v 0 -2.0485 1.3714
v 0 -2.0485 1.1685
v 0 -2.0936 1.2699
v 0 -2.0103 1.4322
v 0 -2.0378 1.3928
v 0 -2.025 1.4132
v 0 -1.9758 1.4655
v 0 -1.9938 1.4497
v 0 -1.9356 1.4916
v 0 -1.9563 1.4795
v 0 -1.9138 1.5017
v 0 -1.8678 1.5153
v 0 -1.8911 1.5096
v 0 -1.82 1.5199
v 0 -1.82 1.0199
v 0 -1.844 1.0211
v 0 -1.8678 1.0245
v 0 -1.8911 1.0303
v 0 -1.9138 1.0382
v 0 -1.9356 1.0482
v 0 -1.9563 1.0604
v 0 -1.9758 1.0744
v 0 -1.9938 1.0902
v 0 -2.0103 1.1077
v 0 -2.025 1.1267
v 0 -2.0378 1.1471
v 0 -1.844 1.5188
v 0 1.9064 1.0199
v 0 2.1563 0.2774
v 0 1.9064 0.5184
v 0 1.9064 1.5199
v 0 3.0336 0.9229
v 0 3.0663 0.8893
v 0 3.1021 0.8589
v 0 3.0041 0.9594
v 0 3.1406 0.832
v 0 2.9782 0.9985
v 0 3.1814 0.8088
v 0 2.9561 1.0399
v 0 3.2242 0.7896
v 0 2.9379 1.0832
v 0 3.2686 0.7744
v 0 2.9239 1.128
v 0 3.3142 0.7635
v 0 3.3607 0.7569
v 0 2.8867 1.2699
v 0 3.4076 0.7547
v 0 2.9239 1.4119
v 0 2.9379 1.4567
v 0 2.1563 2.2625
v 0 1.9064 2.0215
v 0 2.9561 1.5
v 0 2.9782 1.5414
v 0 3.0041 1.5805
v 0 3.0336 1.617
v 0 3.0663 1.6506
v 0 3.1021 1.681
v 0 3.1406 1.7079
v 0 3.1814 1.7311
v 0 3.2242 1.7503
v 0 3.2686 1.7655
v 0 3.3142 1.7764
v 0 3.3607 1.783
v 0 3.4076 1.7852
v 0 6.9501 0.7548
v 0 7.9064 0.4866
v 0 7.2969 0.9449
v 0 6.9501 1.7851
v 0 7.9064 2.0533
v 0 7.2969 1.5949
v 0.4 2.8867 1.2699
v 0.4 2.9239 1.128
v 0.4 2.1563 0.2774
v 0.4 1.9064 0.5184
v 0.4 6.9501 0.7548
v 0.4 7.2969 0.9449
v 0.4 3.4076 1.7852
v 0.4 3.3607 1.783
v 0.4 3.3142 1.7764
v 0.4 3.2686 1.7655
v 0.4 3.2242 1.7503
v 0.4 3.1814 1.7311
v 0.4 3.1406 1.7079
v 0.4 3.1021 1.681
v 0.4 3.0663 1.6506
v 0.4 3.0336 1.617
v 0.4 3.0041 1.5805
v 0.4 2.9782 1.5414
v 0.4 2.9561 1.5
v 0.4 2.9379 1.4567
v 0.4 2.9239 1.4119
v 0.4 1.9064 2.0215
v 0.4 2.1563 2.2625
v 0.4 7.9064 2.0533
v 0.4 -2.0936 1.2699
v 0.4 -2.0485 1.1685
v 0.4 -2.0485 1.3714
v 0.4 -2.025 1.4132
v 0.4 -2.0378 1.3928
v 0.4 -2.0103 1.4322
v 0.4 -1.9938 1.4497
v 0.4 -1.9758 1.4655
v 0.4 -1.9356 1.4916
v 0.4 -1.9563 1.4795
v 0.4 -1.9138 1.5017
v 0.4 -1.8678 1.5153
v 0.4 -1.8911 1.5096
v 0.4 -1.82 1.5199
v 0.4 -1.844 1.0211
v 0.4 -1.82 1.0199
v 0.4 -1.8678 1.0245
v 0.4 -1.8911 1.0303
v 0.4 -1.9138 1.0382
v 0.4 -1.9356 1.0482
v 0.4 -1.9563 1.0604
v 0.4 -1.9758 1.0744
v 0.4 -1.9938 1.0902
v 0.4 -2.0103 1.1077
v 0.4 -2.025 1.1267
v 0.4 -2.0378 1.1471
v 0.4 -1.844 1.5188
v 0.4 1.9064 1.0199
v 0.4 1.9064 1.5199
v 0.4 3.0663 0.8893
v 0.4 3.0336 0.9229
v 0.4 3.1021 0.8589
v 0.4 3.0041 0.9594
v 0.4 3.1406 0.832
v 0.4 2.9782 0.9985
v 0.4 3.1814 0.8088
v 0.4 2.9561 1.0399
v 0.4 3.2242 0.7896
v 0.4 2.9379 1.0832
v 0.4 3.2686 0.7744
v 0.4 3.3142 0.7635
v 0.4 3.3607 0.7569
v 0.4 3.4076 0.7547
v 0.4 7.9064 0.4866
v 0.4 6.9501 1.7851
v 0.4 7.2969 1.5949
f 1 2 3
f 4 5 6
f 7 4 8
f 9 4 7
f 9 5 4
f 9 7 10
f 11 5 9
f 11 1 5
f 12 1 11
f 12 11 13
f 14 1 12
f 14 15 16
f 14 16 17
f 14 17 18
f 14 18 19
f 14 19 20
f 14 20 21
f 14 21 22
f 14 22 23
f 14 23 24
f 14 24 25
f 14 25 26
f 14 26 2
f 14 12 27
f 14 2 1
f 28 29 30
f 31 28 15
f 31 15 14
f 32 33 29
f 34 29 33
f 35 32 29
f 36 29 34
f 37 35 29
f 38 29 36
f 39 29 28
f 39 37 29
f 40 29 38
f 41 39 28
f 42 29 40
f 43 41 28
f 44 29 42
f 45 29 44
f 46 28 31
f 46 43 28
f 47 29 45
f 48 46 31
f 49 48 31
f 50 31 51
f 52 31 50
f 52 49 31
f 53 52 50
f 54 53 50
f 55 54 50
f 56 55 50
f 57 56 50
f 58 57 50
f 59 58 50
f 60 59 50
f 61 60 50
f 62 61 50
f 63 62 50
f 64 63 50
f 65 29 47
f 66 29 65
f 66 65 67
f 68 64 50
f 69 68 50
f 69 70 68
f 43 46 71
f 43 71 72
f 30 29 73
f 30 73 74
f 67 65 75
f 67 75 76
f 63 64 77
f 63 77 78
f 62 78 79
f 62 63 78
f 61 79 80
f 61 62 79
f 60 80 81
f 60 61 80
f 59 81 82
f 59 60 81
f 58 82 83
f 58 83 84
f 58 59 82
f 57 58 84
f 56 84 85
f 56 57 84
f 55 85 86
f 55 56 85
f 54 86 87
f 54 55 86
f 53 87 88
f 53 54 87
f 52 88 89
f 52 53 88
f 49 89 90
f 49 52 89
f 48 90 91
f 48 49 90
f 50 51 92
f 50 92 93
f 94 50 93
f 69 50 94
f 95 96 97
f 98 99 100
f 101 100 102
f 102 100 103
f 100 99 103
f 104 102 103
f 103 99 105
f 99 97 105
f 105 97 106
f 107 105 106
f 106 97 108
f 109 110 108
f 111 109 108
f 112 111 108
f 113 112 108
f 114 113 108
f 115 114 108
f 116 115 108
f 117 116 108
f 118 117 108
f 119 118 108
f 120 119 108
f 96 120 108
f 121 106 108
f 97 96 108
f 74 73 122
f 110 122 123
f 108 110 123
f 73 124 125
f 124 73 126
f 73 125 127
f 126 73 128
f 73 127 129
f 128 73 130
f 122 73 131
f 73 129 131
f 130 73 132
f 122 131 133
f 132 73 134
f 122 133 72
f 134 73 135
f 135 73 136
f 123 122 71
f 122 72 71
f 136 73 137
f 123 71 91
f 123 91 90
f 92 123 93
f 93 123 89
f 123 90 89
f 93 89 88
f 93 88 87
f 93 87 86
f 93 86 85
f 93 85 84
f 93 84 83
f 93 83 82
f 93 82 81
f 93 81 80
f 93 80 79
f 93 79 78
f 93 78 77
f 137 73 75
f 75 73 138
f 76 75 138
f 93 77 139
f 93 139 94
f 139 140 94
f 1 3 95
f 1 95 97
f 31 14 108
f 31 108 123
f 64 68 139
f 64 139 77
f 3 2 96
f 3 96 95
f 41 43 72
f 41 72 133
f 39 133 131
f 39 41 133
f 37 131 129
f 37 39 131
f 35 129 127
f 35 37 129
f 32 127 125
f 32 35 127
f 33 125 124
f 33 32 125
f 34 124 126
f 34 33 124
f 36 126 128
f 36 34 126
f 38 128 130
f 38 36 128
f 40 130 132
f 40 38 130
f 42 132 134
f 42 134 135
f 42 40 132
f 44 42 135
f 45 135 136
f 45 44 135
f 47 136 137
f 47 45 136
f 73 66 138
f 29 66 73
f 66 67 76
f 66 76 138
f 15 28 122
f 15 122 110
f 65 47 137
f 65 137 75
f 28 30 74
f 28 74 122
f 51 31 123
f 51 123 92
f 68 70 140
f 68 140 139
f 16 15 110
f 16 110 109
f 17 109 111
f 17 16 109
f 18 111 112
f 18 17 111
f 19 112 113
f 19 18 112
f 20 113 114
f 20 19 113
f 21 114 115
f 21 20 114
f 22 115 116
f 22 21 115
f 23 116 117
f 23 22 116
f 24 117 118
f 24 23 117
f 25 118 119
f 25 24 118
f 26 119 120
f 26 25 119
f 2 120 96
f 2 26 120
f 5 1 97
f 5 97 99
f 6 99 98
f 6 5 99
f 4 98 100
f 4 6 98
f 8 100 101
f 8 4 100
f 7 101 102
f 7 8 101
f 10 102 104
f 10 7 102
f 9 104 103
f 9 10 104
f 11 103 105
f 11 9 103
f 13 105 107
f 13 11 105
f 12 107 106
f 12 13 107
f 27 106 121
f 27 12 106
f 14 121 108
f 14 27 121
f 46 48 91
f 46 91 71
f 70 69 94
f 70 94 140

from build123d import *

# Parameters (mm, degrees)
BOSS_EXTRUDE1_DEPTH = 0.4


with BuildPart() as part:
    # Sketch1 → Boss-Extrude1 (new body)
    with BuildSketch(Plane(origin=(0, 0, 0), x_dir=(0, 0, -1), z_dir=(1, 0, 0))):
        with BuildLine():
            Line((-0.486576567, 7.906439428), (-0.277438328, 2.156274237))
            Line((-0.277438328, 2.156274237), (-0.518351631, 1.906439428))
            Line((-0.518351631, 1.906439428), (-1.019947879, 1.906439428))
            Line((-1.019947879, 1.906439428), (-1.019947879, -1.820037787))
            ThreePointArc((-1.019947879, -1.820037787), (-1.060356555, -1.956314993), (-1.168519693, -2.048537947))
            Line((-1.168519693, -2.048537947), (-1.269947879, -2.093560572))
            Line((-1.269947879, -2.093560572), (-1.371376066, -2.048537947))
            ThreePointArc((-1.371376066, -2.048537947), (-1.479539204, -1.956314993), (-1.519947879, -1.820037787))
            Line((-1.519947879, -1.820037787), (-1.519947879, 1.906439428))
            Line((-1.519947879, 1.906439428), (-2.021544128, 1.906439428))
            Line((-2.021544128, 1.906439428), (-2.26245743, 2.156274237))
            Line((-2.26245743, 2.156274237), (-2.053319191, 7.906439428))
            Line((-2.053319191, 7.906439428), (-1.594947879, 7.296916042))
            Line((-1.594947879, 7.296916042), (-1.785118415, 6.950118253))
            Line((-1.785118415, 6.950118253), (-1.785185155, 3.40759606))
            ThreePointArc((-1.785185155, 3.40759606), (-1.681017639, 3.102108908), (-1.411909463, 2.923912215))
            Line((-1.411909463, 2.923912215), (-1.269947879, 2.886717808))
            Line((-1.269947879, 2.886717808), (-1.127986296, 2.923912215))
            ThreePointArc((-1.127986296, 2.923912215), (-0.85887812, 3.102108908), (-0.754710604, 3.40759606))
            Line((-0.754710604, 3.40759606), (-0.754777344, 6.950118253))
            Line((-0.754777344, 6.950118253), (-0.944947879, 7.296916042))
            Line((-0.944947879, 7.296916042), (-0.486576567, 7.906439428))
        make_face()
    extrude(amount=BOSS_EXTRUDE1_DEPTH)


solid = part.part
